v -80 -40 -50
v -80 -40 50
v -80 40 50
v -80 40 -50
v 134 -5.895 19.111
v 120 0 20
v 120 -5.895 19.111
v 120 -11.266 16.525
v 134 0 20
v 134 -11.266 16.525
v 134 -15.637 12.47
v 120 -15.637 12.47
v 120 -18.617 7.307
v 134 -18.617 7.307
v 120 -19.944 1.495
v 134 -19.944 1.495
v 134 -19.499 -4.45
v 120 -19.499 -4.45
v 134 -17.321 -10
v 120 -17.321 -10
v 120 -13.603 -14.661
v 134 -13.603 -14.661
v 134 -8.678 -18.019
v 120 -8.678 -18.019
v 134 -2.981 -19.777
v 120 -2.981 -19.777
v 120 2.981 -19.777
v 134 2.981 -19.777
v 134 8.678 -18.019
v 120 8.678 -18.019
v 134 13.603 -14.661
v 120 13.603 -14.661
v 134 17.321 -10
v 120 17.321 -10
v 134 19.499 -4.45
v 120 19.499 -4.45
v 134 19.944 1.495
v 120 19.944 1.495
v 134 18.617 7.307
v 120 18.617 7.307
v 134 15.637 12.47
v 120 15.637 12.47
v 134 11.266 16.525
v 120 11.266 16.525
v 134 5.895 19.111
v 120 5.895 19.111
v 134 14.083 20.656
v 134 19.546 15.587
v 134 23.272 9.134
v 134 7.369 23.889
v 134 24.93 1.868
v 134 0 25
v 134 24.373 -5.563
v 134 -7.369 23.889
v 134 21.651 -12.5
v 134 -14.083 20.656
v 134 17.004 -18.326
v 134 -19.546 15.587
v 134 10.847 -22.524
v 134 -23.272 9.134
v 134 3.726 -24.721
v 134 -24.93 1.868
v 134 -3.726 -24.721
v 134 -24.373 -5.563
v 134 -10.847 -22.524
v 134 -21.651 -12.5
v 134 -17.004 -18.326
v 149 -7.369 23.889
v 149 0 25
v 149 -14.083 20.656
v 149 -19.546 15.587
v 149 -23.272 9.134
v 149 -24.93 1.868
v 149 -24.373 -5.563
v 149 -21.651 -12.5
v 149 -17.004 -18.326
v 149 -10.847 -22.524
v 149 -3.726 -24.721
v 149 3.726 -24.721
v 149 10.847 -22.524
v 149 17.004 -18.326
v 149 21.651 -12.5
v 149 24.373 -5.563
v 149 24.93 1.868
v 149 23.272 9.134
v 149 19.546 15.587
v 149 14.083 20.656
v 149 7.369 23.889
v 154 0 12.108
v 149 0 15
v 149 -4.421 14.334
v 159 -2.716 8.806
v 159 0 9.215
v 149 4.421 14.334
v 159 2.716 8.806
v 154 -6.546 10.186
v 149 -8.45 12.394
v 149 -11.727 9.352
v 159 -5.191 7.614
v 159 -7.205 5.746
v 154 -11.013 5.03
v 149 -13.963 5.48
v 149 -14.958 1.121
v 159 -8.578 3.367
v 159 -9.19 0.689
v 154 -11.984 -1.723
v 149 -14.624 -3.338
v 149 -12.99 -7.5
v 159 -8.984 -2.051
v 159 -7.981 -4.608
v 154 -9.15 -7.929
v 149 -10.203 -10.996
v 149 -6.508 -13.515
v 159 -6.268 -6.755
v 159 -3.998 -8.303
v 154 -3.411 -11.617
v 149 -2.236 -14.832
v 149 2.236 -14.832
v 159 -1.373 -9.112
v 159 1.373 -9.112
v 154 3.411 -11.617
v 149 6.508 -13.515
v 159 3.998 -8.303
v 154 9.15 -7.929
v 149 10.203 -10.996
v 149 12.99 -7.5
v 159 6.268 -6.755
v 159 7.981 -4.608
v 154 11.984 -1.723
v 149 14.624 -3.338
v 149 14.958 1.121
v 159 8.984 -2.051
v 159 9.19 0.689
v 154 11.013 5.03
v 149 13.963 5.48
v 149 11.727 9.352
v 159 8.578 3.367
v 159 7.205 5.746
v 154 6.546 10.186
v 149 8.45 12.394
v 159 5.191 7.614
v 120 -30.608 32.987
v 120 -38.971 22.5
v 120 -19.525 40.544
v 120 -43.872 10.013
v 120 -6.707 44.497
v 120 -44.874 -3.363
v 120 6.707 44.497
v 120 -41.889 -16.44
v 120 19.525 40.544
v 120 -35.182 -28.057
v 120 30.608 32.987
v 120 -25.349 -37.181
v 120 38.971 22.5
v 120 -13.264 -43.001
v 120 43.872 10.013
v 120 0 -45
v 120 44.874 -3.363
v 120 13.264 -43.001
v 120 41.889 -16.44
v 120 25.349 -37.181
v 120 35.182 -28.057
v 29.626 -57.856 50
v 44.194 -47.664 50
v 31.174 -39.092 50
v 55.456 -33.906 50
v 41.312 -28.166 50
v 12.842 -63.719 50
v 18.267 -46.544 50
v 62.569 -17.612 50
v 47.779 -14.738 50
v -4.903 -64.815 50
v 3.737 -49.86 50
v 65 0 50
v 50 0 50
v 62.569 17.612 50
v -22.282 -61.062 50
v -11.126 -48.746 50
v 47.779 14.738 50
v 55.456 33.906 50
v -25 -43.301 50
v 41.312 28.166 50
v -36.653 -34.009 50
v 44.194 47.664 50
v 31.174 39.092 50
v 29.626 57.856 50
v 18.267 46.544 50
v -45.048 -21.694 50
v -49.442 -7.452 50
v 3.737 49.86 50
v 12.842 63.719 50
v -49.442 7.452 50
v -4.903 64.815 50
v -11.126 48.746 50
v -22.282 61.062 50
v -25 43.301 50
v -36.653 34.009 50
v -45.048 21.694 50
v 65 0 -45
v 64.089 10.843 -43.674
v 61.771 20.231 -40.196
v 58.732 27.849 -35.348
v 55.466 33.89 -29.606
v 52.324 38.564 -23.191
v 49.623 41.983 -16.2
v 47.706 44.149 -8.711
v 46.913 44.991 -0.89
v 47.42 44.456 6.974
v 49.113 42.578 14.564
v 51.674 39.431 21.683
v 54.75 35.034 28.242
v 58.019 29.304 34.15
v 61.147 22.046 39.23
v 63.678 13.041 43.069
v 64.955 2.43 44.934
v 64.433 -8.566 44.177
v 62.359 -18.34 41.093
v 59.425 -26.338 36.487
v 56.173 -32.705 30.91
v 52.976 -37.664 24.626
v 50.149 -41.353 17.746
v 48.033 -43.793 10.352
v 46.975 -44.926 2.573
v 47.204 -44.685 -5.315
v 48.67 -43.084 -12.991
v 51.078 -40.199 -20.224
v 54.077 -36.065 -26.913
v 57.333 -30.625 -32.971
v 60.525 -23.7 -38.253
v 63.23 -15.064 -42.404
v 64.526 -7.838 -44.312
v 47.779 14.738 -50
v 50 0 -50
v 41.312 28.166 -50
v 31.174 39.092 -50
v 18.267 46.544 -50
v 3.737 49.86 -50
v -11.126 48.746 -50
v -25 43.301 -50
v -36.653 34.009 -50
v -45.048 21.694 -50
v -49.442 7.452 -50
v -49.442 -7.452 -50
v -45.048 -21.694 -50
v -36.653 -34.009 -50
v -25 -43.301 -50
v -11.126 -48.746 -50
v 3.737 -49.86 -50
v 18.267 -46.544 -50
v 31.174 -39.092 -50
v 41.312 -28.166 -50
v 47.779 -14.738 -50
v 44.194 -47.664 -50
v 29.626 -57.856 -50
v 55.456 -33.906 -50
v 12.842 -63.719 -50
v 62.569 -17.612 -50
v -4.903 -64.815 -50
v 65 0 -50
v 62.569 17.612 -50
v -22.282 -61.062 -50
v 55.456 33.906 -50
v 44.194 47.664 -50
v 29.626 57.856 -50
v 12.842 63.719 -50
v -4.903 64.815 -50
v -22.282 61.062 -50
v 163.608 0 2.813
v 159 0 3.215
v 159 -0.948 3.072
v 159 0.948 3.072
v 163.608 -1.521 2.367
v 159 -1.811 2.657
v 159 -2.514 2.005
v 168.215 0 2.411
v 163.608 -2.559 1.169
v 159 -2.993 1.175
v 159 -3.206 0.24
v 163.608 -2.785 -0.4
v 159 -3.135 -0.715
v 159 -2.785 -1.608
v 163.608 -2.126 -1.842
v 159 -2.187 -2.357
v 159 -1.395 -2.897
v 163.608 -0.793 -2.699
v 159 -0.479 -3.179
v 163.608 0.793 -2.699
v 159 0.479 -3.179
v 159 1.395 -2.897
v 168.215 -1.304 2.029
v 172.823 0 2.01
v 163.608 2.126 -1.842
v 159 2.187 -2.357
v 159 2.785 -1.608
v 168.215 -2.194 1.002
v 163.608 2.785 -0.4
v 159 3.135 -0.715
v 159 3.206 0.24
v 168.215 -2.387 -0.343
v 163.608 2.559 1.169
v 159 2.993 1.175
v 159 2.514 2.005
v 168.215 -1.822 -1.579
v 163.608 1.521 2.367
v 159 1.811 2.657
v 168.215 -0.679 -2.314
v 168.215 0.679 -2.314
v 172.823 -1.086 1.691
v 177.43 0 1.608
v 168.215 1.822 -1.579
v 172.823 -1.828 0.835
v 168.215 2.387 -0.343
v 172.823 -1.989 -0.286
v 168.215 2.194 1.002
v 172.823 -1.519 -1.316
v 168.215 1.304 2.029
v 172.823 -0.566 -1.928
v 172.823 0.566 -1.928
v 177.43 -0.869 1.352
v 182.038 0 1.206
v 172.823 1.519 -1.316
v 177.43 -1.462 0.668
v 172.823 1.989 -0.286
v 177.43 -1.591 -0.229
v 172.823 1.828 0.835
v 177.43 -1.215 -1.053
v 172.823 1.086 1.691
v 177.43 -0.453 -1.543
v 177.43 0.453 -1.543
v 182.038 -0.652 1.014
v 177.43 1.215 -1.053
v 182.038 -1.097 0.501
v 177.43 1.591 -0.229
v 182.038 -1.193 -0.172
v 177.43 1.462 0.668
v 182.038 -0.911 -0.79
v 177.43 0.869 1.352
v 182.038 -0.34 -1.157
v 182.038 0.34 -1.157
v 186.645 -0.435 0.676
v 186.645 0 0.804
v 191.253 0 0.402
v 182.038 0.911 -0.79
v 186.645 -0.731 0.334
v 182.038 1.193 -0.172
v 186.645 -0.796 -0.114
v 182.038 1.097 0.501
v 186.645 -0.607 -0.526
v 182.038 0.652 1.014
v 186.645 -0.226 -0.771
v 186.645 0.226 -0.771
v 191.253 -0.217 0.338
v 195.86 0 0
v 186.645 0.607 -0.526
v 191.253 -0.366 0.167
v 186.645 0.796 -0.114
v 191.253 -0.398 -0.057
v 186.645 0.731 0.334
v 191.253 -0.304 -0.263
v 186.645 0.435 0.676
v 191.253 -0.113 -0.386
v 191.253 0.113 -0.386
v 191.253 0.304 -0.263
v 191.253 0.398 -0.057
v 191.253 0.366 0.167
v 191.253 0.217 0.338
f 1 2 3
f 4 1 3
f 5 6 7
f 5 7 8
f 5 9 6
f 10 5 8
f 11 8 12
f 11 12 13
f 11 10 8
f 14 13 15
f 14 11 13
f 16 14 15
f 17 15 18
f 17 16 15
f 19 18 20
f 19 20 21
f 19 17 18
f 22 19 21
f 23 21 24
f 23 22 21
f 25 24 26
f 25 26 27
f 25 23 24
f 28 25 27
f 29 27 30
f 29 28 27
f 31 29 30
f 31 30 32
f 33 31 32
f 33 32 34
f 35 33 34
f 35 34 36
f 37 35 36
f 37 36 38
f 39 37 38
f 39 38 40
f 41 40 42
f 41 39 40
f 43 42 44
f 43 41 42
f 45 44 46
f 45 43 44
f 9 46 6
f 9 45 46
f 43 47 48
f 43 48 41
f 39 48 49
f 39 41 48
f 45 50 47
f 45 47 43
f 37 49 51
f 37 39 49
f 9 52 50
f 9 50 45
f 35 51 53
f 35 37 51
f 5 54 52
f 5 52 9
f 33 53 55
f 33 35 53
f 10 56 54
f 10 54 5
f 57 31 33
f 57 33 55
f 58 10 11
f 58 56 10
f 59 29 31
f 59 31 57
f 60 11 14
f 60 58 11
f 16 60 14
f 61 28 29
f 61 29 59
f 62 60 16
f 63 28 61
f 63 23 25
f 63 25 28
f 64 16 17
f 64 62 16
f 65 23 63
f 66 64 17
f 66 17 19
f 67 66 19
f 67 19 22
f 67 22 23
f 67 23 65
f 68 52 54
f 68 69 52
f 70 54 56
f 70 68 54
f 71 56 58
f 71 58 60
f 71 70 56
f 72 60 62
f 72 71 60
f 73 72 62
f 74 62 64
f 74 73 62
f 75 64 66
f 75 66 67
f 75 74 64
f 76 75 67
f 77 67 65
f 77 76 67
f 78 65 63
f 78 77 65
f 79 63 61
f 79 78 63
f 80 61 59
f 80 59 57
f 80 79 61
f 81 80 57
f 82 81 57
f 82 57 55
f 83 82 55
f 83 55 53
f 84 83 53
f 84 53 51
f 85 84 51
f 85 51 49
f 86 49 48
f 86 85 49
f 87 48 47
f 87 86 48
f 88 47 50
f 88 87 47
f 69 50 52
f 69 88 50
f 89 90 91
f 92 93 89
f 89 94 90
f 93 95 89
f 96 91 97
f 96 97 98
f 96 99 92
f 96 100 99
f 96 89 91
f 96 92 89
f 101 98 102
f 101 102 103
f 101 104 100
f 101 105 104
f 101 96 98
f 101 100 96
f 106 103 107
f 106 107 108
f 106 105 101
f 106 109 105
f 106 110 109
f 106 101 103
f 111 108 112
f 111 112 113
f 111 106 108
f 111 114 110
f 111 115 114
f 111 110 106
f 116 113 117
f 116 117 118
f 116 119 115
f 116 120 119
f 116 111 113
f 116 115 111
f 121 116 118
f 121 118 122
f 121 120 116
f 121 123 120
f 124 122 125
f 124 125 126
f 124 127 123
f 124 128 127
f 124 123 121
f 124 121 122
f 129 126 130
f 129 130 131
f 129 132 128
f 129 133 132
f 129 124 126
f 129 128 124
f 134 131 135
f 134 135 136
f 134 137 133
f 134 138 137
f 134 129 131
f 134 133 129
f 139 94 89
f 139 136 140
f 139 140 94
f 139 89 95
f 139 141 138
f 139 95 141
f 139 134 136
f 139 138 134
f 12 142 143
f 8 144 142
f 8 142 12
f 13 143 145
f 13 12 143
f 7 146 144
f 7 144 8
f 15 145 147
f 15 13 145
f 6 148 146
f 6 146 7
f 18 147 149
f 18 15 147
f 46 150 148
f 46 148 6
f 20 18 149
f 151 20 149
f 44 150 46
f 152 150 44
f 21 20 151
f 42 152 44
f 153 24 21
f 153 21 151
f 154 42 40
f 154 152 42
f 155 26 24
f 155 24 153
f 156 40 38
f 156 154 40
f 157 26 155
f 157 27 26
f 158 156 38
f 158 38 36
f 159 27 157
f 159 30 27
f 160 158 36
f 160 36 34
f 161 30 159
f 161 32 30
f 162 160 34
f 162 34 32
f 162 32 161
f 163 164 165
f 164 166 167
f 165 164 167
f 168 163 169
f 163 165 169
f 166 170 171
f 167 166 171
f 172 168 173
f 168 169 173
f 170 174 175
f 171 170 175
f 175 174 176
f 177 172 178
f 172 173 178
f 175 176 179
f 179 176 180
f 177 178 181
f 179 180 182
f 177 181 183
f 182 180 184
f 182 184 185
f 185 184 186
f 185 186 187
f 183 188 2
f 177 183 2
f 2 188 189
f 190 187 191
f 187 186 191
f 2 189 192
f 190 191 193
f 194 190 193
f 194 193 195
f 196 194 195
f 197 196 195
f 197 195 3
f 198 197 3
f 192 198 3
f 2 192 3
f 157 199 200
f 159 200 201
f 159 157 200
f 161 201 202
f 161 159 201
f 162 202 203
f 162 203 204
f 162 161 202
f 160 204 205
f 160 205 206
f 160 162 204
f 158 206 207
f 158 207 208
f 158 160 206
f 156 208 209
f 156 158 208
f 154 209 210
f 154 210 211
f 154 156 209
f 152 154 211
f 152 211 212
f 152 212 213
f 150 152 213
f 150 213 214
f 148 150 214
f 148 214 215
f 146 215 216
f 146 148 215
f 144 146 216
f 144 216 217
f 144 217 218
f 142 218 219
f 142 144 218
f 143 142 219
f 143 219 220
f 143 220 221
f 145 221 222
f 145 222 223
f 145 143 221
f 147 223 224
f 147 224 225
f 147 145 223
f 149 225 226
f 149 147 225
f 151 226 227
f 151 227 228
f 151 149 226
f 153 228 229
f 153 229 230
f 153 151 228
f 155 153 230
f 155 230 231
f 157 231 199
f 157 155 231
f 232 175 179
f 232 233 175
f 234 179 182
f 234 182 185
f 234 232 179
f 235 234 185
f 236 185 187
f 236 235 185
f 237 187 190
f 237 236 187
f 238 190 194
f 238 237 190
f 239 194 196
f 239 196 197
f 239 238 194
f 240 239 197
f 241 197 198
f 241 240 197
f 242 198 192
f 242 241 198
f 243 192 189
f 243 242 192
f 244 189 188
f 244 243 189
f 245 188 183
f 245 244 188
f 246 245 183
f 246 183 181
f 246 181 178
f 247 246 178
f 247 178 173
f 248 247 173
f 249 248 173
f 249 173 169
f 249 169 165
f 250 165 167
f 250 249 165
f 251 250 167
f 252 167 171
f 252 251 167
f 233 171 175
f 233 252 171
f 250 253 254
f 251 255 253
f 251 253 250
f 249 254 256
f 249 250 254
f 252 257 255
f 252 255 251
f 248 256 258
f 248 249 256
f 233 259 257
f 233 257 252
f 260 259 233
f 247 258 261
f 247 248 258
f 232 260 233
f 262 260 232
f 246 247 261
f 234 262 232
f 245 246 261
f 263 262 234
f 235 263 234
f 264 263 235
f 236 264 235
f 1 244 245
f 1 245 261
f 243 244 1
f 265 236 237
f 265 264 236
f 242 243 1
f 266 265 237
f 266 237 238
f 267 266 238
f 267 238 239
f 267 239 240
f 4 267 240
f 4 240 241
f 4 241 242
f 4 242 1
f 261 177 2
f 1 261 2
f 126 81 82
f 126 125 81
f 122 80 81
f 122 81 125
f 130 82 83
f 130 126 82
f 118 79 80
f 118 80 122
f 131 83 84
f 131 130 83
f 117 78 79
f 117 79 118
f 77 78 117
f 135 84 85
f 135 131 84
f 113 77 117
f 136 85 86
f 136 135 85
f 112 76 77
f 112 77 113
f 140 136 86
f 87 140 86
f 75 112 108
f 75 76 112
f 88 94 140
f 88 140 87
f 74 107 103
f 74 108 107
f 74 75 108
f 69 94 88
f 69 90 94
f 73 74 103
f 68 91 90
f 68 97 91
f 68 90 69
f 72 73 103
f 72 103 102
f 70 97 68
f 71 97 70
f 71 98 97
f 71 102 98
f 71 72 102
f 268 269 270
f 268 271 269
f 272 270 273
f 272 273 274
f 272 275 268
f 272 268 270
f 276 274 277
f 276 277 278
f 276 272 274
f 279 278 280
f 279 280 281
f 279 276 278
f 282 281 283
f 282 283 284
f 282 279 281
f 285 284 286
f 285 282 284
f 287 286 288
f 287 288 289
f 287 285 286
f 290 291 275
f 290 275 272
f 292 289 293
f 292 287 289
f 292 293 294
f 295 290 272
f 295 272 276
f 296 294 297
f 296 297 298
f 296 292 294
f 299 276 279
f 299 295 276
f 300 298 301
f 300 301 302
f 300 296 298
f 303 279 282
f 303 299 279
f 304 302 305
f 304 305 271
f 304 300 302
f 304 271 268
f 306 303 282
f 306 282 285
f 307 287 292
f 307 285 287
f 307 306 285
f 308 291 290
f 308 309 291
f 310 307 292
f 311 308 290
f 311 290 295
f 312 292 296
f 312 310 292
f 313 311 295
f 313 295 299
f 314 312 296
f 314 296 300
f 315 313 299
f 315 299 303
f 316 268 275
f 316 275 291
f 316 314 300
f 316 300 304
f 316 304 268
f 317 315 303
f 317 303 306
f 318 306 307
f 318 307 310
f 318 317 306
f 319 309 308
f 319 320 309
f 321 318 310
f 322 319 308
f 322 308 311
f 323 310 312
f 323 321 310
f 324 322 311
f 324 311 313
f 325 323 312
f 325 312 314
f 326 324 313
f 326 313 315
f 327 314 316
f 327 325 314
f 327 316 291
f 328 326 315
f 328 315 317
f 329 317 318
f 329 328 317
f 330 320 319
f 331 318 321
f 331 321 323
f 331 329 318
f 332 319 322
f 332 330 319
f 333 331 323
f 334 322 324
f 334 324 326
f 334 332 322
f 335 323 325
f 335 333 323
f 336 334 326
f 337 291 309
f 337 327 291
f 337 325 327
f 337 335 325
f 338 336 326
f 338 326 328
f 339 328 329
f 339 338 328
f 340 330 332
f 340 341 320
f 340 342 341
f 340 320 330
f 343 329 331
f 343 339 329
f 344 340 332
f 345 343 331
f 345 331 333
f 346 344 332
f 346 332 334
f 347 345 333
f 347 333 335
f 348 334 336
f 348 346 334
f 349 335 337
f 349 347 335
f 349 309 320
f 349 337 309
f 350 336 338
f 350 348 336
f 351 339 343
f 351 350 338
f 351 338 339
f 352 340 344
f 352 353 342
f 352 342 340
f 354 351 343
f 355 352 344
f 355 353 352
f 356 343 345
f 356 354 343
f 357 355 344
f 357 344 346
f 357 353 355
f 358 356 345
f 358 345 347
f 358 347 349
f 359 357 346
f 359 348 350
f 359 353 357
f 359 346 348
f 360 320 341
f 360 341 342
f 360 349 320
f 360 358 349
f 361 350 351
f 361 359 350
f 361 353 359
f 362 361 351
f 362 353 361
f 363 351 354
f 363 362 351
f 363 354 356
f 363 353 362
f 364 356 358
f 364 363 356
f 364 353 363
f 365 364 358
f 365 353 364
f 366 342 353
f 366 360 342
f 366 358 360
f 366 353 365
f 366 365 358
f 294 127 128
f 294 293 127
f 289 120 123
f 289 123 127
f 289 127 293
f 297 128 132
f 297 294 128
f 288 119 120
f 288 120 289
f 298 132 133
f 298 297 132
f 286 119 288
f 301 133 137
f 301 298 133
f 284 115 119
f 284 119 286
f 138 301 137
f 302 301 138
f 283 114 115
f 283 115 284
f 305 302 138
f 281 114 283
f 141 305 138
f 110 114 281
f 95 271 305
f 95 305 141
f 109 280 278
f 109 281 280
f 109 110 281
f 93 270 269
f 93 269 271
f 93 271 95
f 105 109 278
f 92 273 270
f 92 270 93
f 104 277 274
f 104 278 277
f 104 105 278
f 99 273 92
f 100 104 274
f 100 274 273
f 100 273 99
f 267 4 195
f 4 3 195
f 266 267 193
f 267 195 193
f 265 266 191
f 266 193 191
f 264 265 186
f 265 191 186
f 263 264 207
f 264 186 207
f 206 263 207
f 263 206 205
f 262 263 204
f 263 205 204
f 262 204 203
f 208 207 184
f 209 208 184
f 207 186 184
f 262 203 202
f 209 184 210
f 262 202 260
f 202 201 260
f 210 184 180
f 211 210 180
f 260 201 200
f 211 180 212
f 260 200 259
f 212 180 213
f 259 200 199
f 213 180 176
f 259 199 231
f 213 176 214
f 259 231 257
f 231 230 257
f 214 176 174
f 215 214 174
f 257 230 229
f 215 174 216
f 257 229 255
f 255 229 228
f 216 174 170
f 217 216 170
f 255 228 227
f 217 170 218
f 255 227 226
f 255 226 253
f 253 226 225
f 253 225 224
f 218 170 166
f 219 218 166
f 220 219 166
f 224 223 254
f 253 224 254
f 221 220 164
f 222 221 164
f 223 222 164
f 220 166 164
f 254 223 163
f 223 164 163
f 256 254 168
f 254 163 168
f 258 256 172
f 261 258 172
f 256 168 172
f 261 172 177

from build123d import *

# Parameters (mm, degrees)
CROQUIS1_R                   = 50
SALIENTE_EXTRUIR1_DEPTH      = 50
SALIENTE_EXTRUIR2_REACH      = 218.16
SALIENTE_EXTRUIR2_END_RADIUS = 65
CROQUIS2_R                   = 45


with BuildPart() as part:
    # Croquis1 → Saliente-Extruir1 (new, symmetric)
    with BuildSketch(Plane.XY):
        with BuildLine():
            Line((-80, -40), (-80, 40))
            Line((-80, 40), (-22.281665693, 61.061668614))
            ThreePointArc((-22.281665693, 61.061668614), (65, 0), (-22.281665693, -61.061668614))
            Line((-22.281665693, -61.061668614), (-80, -40))
        make_face()
        Circle(CROQUIS1_R, mode=Mode.SUBTRACT)
    extrude(amount=SALIENTE_EXTRUIR1_DEPTH, both=True)

    # Saliente-Extruir2: up to this cylinder (the profile starts outside it)
    saliente_extruir2_end = Plane(origin=(0, 0, 0), z_dir=(0, 0, -1)) * Cylinder(SALIENTE_EXTRUIR2_END_RADIUS, 567.32, mode=Mode.PRIVATE)
    # Croquis2 → Saliente-Extruir2 (add, up to the surface)
    with BuildSketch(Plane(origin=(120, 0, 0), x_dir=(0, 0, -1), z_dir=(1, 0, 0)), mode=Mode.PRIVATE) as saliente_extruir2_sk1:
        Circle(CROQUIS2_R)
    saliente_extruir2_tool1 = extrude(saliente_extruir2_sk1.sketch, amount=-SALIENTE_EXTRUIR2_REACH, mode=Mode.PRIVATE) - saliente_extruir2_end
    add(saliente_extruir2_tool1.solids().sort_by_distance((120, 0, 0))[0])

    # Croquis3 → Revolución1 (revolve)
    with BuildSketch(Plane.XY, mode=Mode.PRIVATE) as revoluci_n1_sk:
        Polygon((120, 0), (120, -20), (134, -20), (134, -25), (149, -25), (149, -15), (159, -9.215277891), (159, -3.215277891), (195.860032394, 0), align=None)
    revolve(revoluci_n1_sk.sketch.rotate(Axis((0, 0, 0), (1, 0, 0)), 270), axis=Axis((0, 0, 0), (1, 0, 0)))


solid = part.part
